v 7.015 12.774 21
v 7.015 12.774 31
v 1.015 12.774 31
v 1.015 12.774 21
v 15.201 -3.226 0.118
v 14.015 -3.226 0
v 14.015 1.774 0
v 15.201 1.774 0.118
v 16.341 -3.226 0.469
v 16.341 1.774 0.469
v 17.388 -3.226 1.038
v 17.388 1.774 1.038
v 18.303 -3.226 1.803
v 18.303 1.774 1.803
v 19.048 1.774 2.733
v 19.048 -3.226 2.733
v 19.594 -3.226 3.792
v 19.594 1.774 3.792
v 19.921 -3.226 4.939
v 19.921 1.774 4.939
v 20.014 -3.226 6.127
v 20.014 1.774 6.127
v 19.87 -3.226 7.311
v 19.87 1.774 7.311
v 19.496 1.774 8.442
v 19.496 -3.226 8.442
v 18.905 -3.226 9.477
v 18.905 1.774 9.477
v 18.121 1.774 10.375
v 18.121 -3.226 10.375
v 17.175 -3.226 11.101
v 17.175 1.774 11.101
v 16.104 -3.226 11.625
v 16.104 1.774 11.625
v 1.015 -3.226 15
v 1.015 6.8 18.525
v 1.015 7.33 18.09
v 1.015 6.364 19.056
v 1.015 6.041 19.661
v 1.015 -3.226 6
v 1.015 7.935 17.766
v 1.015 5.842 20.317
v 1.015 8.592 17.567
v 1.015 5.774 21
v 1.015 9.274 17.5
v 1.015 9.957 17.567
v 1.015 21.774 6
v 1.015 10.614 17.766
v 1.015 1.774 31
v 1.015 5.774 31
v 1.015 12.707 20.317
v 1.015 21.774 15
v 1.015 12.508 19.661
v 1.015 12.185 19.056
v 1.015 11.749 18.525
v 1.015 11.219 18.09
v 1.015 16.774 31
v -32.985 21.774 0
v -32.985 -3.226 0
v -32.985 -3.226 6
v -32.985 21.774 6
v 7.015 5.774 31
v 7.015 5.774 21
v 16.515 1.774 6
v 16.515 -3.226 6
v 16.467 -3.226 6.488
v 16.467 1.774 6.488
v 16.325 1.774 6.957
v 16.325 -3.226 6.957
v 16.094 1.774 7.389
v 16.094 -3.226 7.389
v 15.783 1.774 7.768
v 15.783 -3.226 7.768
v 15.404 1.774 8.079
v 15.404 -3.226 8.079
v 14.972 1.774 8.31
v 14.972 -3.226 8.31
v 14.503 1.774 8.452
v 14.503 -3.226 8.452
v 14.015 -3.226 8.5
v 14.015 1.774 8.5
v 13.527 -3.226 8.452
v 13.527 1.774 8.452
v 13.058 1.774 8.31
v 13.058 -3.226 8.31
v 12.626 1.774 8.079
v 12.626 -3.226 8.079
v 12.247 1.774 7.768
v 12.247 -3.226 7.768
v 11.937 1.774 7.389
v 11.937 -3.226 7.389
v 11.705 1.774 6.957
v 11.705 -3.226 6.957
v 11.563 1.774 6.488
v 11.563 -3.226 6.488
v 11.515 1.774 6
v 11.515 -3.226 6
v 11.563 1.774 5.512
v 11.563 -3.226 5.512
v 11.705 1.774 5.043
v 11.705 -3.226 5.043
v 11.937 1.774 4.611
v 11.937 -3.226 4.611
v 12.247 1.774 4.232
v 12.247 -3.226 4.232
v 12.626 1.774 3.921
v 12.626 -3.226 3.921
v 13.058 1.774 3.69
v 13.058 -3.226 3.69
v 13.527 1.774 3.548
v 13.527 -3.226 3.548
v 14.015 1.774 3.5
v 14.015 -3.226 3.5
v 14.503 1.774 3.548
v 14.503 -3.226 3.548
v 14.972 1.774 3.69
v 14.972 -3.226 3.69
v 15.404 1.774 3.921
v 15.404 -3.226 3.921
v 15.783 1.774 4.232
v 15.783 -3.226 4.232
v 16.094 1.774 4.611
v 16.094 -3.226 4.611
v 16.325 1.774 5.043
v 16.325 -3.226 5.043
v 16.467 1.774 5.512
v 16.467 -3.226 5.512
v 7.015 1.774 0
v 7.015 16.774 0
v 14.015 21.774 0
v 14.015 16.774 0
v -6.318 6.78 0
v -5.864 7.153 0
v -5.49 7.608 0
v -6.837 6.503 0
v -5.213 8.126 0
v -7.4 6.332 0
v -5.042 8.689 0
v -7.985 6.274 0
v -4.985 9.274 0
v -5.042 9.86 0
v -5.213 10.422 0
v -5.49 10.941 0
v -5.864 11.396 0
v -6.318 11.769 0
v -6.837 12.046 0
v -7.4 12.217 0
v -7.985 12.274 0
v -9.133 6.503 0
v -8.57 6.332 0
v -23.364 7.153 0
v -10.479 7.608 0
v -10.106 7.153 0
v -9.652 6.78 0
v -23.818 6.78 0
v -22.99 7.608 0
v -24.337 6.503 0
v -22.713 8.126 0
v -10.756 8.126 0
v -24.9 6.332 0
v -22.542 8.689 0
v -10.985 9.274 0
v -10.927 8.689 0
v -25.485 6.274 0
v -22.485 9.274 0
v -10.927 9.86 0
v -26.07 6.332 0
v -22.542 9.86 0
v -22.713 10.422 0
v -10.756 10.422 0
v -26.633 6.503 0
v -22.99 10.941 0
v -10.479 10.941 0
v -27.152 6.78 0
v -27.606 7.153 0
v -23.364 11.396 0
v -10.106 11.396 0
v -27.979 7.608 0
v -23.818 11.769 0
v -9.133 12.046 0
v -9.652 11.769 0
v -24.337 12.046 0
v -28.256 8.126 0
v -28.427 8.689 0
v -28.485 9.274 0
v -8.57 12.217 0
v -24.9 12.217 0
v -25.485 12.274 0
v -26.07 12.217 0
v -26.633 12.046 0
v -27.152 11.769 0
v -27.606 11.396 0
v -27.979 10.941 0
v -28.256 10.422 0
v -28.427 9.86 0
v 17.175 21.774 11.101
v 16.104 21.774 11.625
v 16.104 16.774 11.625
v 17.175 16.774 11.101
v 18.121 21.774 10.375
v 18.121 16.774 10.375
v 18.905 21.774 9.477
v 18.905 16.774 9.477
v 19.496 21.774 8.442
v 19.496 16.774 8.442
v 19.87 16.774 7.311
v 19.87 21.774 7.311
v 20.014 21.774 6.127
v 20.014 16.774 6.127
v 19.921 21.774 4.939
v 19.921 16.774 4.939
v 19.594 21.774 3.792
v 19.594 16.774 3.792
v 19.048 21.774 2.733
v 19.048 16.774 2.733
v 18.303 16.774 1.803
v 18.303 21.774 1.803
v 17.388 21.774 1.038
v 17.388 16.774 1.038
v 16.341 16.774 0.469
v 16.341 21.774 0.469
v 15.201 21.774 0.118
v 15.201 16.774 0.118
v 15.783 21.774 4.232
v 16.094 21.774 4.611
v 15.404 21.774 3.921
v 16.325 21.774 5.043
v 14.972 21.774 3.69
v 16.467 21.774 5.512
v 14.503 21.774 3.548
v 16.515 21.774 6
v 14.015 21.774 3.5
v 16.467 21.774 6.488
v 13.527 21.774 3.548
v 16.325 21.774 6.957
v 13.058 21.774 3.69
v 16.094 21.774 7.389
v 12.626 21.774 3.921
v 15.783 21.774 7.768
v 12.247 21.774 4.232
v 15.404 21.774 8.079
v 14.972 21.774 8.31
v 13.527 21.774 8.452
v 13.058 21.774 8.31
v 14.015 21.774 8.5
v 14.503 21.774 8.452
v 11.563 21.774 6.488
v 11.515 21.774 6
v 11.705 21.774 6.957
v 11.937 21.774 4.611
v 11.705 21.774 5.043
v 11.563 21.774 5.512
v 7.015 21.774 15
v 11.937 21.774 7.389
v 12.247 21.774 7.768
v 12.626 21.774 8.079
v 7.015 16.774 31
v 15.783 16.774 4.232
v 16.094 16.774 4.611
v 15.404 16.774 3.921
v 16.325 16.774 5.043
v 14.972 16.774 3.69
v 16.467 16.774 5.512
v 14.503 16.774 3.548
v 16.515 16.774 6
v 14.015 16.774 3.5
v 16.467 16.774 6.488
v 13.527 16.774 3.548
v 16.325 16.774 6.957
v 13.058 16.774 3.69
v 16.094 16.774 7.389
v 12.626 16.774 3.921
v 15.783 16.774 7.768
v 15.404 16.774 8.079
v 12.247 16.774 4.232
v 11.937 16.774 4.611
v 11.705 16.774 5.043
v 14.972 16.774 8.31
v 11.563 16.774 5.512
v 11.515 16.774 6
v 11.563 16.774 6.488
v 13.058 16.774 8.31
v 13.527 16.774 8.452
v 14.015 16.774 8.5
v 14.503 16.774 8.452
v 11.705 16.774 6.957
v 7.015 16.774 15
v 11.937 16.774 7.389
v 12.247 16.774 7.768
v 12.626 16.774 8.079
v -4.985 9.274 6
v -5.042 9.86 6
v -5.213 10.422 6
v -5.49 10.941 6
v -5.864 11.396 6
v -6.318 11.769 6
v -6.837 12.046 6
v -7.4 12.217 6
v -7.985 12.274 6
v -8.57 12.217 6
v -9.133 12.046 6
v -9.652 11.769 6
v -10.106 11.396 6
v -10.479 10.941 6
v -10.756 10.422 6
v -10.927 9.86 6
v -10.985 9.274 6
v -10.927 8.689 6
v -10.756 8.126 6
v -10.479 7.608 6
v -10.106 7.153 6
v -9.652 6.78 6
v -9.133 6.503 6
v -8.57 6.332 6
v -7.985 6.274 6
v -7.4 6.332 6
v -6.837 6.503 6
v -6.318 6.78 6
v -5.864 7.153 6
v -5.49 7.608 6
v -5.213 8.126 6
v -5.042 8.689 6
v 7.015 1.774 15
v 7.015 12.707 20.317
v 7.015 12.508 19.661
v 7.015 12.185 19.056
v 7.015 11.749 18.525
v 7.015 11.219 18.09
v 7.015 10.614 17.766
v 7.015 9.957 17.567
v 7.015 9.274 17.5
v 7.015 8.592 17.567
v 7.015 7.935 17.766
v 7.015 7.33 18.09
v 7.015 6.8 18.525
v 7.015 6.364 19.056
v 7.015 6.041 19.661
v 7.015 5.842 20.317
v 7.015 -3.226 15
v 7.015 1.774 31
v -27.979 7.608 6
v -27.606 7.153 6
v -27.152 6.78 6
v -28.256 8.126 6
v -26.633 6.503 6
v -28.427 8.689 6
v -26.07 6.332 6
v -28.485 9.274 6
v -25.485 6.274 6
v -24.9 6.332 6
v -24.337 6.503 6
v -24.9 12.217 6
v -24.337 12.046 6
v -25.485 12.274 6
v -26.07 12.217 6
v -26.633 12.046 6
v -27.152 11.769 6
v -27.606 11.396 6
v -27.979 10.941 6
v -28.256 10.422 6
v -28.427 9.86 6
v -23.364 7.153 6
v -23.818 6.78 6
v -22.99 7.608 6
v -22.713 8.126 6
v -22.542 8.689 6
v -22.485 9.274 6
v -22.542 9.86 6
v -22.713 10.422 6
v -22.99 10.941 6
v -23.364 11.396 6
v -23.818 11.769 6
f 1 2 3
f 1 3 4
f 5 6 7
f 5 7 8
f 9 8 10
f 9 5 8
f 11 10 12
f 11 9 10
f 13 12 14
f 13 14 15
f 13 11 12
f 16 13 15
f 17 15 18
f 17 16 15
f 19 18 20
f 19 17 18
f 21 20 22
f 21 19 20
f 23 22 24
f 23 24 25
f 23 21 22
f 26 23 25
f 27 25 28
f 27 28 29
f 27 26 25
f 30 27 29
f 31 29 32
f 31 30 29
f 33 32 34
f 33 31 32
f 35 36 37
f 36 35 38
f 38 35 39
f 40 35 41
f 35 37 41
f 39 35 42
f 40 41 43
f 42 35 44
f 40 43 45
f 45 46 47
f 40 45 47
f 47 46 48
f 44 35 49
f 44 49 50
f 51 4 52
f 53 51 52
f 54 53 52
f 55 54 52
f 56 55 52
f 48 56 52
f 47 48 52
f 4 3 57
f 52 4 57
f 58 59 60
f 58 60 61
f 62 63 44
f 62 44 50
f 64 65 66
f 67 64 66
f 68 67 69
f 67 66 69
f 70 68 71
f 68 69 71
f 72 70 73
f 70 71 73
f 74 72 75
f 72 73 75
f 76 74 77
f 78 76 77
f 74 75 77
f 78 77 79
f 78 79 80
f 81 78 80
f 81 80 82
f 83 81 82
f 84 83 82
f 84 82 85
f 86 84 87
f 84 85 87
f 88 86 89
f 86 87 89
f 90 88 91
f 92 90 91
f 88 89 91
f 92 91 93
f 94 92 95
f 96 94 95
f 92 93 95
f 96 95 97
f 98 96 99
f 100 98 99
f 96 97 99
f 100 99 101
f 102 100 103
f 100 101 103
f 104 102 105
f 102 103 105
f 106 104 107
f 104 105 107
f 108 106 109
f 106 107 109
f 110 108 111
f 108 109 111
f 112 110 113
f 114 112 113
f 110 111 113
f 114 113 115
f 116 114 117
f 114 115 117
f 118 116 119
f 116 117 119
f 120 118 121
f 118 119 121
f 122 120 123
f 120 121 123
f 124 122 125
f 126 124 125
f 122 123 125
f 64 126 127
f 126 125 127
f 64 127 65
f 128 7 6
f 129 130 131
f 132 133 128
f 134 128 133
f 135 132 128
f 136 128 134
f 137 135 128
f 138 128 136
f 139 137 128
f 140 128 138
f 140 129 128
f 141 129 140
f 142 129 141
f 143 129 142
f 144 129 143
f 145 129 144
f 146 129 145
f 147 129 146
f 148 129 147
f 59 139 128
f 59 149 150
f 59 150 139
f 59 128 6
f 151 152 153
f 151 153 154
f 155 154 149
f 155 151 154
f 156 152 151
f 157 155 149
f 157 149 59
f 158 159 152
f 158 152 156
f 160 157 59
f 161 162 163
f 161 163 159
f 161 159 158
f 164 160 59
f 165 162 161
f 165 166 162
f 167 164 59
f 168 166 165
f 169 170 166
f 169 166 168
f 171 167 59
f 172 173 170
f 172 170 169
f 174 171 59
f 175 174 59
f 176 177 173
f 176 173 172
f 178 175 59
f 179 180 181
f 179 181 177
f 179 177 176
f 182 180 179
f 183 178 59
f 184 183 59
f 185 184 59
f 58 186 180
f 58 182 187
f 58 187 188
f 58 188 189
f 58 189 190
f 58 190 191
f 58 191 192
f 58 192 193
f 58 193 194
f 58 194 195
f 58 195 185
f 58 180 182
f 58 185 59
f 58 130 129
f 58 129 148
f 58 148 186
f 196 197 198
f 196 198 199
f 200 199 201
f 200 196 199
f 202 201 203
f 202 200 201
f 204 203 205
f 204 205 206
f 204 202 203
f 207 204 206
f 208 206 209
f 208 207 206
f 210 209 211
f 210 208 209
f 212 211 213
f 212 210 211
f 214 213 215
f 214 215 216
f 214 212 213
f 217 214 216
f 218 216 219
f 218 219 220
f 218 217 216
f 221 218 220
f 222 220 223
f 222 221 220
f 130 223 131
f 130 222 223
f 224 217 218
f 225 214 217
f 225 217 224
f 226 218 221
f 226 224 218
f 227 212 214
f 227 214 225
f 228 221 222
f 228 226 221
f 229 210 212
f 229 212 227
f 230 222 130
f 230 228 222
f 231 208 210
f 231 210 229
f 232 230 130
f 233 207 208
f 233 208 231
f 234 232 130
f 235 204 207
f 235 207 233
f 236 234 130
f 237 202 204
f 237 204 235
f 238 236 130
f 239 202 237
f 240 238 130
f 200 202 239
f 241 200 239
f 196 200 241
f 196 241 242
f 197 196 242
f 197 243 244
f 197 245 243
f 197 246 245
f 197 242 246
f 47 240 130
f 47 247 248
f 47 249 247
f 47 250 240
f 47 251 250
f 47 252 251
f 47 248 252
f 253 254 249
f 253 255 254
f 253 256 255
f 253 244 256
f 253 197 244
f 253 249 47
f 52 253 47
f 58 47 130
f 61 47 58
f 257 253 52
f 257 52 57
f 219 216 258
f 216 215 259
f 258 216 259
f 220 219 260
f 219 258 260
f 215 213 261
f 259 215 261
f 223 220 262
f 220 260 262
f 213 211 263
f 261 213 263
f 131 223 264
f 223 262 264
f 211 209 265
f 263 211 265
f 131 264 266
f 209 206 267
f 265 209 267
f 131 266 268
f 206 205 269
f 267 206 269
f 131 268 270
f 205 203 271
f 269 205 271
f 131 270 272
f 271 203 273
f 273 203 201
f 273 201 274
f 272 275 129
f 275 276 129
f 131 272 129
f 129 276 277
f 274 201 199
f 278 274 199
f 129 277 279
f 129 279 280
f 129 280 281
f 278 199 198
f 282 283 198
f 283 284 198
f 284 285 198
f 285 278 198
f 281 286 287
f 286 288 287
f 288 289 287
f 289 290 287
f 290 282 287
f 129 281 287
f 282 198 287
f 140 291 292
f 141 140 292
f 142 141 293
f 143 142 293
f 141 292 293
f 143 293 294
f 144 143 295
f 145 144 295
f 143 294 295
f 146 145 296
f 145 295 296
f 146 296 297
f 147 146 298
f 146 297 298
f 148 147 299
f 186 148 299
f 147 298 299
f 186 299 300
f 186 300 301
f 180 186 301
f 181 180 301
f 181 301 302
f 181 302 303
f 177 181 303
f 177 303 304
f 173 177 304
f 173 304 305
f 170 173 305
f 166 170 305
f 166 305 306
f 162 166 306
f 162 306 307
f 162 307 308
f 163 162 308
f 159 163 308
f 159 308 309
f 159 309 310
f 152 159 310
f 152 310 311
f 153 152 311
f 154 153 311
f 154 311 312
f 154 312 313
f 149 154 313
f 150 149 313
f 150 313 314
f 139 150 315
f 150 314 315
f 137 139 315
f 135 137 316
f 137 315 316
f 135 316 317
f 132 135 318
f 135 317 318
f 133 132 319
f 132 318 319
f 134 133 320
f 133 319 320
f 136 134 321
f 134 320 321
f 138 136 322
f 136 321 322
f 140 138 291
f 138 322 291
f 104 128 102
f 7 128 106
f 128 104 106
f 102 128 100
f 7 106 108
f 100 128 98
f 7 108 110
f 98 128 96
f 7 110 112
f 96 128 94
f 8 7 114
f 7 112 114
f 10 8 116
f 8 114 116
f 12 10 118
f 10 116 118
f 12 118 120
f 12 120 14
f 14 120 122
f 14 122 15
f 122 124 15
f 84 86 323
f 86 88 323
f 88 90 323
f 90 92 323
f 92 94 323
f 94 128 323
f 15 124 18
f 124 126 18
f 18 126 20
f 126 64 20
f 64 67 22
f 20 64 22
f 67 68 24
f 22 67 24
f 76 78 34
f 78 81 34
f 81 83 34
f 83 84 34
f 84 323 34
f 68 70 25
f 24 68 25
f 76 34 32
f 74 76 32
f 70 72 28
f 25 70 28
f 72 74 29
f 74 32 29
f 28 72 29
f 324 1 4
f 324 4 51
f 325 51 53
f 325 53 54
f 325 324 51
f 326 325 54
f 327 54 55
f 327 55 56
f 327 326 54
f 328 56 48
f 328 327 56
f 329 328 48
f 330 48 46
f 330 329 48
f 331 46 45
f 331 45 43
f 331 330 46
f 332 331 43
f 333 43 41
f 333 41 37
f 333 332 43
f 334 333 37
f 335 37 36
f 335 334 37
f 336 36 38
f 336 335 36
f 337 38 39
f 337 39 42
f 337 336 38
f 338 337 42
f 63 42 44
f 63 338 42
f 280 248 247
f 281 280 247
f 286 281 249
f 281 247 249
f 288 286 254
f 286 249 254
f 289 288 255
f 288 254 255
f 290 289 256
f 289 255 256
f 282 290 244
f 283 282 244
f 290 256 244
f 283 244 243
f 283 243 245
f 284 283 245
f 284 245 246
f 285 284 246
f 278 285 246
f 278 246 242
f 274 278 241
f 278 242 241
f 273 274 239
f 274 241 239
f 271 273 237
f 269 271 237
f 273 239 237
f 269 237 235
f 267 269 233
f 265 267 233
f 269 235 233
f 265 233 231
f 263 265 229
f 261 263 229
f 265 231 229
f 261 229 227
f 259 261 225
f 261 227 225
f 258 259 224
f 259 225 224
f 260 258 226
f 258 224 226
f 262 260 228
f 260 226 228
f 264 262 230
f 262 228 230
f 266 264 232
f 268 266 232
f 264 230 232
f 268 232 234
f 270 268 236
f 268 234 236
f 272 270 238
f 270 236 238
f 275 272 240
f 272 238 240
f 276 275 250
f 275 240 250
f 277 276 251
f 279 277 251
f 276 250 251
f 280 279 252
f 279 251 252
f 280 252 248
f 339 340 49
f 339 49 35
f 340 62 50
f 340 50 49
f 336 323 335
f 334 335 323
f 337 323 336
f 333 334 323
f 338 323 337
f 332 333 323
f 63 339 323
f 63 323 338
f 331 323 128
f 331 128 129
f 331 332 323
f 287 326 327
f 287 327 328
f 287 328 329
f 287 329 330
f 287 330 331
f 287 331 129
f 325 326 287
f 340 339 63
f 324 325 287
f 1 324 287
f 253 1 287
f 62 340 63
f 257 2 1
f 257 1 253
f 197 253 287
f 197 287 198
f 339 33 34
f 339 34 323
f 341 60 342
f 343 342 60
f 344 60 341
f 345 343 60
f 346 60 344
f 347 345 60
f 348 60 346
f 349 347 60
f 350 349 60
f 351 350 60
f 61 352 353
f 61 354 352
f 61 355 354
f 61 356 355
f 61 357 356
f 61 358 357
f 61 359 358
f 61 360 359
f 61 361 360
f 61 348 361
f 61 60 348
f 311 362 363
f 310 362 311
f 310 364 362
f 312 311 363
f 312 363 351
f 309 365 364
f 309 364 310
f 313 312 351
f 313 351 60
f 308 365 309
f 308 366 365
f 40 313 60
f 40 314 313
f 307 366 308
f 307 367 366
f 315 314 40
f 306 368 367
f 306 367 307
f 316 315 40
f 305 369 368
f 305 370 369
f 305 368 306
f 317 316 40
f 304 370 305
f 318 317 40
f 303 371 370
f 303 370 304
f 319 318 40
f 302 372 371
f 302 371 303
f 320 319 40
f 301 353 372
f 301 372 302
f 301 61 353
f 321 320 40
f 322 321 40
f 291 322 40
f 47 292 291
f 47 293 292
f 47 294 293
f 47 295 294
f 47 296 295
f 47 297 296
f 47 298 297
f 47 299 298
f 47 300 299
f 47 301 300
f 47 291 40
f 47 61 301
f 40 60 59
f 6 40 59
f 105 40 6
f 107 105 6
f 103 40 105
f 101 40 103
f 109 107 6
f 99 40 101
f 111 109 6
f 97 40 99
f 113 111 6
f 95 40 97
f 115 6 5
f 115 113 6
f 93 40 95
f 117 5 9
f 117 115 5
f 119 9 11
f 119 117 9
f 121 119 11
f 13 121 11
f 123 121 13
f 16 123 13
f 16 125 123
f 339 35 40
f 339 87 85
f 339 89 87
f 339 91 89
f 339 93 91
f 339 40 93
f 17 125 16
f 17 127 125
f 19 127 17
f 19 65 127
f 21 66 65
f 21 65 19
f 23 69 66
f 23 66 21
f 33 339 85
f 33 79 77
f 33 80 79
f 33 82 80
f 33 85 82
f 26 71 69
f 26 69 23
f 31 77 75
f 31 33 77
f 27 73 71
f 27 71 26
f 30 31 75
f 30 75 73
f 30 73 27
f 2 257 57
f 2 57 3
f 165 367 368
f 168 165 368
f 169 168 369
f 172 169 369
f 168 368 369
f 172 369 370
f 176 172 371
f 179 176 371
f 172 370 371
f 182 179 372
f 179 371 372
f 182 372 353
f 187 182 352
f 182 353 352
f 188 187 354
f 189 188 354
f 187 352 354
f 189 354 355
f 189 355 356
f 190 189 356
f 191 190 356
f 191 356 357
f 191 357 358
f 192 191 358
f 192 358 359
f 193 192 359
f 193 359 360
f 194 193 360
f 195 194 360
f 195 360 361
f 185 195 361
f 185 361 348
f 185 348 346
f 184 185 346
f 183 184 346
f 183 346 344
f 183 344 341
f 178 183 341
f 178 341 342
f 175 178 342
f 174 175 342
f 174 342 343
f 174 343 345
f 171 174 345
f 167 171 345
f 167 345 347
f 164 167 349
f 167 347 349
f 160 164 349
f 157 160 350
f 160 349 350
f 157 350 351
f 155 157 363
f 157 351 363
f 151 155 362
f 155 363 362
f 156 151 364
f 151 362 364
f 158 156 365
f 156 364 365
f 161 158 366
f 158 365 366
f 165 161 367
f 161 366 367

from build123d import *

# Parameters (mm, degrees)
F0_W      = 40
F0_H      = 25
F1_DEPTH  = 6
F2_W      = 6
F2_H      = 25
F3_DEPTH  = 9
F5_DEPTH  = 6
F6_R      = 2.5
F7_DEPTH  = 5
F8_R      = 2.5
F9_DEPTH  = 5
F10_R     = 3
F11_DEPTH = 6.001


with BuildPart() as f1:
    # F0 (on Top) → F1 (new body)
    with BuildSketch(Plane.XY):
        with Locations((-12.984823, 9.274423)):
            Rectangle(F0_W, F0_H)
    extrude(amount=F1_DEPTH)

    # F2 (on face) → F3 (join)
    with BuildSketch(Plane.XY.offset(6)):
        with Locations((4.015177, 9.274423)):
            Rectangle(F2_W, F2_H)
    extrude(amount=F3_DEPTH)

    # F4 (on face) → F5 (join)
    with BuildSketch(Plane.YZ.offset(7.015177)):
        with BuildLine():
            Line((12.774423, 31), (12.774423, 21))
            ThreePointArc((12.774423, 21), (9.274423, 17.5), (5.774423, 21))
            Line((5.774423, 21), (5.774423, 31))
            Line((5.774423, 31), (1.774423, 31))
            Line((1.774423, 31), (-3.225577, 15))
            Line((-3.225577, 15), (21.774423, 15))
            Line((21.774423, 15), (16.774423, 31))
            Line((16.774423, 31), (12.774423, 31))
        make_face()
    extrude(amount=-F5_DEPTH)

    # F6 (on face) → F7 (join)
    with BuildSketch(Plane.XZ.offset(3.225577)):
        with BuildLine():
            Line((7.015177, 15), (7.015177, 0))
            Line((7.015177, 0), (14.015177, 0))
            ThreePointArc((14.015177, 0), (19.920596, 4.938852), (16.104019, 11.624655))
            Line((16.104019, 11.624655), (7.015177, 15))
        make_face()
        with Locations((14.015177, 6)):
            Circle(F6_R, mode=Mode.SUBTRACT)
    extrude(amount=-F7_DEPTH)

    # F8 (on face) → F9 (join)
    with BuildSketch(Plane(origin=(0, 21.774423, 0), x_dir=(-1, 0, 0), z_dir=(0, 1, 0))):
        with BuildLine():
            Line((-7.015177, 0), (-7.015177, 15))
            Line((-7.015177, 15), (-16.104019, 11.624655))
            ThreePointArc((-16.104019, 11.624655), (-19.920596, 4.938852), (-14.015177, 0))
            Line((-14.015177, 0), (-7.015177, 0))
        make_face()
        with Locations((-14.015177, 6)):
            Circle(F8_R, mode=Mode.SUBTRACT)
    extrude(amount=-F9_DEPTH)

    # F10 (on face) → F11 (cut, through all)
    with BuildSketch(Plane.XY.offset(6)):
        with Locations((-7.984823, 9.274423)):
            Circle(F10_R)
        with Locations((-25.484823, 9.274423)):
            Circle(F10_R)
    extrude(amount=-F11_DEPTH, mode=Mode.SUBTRACT)


solid = f1.part
